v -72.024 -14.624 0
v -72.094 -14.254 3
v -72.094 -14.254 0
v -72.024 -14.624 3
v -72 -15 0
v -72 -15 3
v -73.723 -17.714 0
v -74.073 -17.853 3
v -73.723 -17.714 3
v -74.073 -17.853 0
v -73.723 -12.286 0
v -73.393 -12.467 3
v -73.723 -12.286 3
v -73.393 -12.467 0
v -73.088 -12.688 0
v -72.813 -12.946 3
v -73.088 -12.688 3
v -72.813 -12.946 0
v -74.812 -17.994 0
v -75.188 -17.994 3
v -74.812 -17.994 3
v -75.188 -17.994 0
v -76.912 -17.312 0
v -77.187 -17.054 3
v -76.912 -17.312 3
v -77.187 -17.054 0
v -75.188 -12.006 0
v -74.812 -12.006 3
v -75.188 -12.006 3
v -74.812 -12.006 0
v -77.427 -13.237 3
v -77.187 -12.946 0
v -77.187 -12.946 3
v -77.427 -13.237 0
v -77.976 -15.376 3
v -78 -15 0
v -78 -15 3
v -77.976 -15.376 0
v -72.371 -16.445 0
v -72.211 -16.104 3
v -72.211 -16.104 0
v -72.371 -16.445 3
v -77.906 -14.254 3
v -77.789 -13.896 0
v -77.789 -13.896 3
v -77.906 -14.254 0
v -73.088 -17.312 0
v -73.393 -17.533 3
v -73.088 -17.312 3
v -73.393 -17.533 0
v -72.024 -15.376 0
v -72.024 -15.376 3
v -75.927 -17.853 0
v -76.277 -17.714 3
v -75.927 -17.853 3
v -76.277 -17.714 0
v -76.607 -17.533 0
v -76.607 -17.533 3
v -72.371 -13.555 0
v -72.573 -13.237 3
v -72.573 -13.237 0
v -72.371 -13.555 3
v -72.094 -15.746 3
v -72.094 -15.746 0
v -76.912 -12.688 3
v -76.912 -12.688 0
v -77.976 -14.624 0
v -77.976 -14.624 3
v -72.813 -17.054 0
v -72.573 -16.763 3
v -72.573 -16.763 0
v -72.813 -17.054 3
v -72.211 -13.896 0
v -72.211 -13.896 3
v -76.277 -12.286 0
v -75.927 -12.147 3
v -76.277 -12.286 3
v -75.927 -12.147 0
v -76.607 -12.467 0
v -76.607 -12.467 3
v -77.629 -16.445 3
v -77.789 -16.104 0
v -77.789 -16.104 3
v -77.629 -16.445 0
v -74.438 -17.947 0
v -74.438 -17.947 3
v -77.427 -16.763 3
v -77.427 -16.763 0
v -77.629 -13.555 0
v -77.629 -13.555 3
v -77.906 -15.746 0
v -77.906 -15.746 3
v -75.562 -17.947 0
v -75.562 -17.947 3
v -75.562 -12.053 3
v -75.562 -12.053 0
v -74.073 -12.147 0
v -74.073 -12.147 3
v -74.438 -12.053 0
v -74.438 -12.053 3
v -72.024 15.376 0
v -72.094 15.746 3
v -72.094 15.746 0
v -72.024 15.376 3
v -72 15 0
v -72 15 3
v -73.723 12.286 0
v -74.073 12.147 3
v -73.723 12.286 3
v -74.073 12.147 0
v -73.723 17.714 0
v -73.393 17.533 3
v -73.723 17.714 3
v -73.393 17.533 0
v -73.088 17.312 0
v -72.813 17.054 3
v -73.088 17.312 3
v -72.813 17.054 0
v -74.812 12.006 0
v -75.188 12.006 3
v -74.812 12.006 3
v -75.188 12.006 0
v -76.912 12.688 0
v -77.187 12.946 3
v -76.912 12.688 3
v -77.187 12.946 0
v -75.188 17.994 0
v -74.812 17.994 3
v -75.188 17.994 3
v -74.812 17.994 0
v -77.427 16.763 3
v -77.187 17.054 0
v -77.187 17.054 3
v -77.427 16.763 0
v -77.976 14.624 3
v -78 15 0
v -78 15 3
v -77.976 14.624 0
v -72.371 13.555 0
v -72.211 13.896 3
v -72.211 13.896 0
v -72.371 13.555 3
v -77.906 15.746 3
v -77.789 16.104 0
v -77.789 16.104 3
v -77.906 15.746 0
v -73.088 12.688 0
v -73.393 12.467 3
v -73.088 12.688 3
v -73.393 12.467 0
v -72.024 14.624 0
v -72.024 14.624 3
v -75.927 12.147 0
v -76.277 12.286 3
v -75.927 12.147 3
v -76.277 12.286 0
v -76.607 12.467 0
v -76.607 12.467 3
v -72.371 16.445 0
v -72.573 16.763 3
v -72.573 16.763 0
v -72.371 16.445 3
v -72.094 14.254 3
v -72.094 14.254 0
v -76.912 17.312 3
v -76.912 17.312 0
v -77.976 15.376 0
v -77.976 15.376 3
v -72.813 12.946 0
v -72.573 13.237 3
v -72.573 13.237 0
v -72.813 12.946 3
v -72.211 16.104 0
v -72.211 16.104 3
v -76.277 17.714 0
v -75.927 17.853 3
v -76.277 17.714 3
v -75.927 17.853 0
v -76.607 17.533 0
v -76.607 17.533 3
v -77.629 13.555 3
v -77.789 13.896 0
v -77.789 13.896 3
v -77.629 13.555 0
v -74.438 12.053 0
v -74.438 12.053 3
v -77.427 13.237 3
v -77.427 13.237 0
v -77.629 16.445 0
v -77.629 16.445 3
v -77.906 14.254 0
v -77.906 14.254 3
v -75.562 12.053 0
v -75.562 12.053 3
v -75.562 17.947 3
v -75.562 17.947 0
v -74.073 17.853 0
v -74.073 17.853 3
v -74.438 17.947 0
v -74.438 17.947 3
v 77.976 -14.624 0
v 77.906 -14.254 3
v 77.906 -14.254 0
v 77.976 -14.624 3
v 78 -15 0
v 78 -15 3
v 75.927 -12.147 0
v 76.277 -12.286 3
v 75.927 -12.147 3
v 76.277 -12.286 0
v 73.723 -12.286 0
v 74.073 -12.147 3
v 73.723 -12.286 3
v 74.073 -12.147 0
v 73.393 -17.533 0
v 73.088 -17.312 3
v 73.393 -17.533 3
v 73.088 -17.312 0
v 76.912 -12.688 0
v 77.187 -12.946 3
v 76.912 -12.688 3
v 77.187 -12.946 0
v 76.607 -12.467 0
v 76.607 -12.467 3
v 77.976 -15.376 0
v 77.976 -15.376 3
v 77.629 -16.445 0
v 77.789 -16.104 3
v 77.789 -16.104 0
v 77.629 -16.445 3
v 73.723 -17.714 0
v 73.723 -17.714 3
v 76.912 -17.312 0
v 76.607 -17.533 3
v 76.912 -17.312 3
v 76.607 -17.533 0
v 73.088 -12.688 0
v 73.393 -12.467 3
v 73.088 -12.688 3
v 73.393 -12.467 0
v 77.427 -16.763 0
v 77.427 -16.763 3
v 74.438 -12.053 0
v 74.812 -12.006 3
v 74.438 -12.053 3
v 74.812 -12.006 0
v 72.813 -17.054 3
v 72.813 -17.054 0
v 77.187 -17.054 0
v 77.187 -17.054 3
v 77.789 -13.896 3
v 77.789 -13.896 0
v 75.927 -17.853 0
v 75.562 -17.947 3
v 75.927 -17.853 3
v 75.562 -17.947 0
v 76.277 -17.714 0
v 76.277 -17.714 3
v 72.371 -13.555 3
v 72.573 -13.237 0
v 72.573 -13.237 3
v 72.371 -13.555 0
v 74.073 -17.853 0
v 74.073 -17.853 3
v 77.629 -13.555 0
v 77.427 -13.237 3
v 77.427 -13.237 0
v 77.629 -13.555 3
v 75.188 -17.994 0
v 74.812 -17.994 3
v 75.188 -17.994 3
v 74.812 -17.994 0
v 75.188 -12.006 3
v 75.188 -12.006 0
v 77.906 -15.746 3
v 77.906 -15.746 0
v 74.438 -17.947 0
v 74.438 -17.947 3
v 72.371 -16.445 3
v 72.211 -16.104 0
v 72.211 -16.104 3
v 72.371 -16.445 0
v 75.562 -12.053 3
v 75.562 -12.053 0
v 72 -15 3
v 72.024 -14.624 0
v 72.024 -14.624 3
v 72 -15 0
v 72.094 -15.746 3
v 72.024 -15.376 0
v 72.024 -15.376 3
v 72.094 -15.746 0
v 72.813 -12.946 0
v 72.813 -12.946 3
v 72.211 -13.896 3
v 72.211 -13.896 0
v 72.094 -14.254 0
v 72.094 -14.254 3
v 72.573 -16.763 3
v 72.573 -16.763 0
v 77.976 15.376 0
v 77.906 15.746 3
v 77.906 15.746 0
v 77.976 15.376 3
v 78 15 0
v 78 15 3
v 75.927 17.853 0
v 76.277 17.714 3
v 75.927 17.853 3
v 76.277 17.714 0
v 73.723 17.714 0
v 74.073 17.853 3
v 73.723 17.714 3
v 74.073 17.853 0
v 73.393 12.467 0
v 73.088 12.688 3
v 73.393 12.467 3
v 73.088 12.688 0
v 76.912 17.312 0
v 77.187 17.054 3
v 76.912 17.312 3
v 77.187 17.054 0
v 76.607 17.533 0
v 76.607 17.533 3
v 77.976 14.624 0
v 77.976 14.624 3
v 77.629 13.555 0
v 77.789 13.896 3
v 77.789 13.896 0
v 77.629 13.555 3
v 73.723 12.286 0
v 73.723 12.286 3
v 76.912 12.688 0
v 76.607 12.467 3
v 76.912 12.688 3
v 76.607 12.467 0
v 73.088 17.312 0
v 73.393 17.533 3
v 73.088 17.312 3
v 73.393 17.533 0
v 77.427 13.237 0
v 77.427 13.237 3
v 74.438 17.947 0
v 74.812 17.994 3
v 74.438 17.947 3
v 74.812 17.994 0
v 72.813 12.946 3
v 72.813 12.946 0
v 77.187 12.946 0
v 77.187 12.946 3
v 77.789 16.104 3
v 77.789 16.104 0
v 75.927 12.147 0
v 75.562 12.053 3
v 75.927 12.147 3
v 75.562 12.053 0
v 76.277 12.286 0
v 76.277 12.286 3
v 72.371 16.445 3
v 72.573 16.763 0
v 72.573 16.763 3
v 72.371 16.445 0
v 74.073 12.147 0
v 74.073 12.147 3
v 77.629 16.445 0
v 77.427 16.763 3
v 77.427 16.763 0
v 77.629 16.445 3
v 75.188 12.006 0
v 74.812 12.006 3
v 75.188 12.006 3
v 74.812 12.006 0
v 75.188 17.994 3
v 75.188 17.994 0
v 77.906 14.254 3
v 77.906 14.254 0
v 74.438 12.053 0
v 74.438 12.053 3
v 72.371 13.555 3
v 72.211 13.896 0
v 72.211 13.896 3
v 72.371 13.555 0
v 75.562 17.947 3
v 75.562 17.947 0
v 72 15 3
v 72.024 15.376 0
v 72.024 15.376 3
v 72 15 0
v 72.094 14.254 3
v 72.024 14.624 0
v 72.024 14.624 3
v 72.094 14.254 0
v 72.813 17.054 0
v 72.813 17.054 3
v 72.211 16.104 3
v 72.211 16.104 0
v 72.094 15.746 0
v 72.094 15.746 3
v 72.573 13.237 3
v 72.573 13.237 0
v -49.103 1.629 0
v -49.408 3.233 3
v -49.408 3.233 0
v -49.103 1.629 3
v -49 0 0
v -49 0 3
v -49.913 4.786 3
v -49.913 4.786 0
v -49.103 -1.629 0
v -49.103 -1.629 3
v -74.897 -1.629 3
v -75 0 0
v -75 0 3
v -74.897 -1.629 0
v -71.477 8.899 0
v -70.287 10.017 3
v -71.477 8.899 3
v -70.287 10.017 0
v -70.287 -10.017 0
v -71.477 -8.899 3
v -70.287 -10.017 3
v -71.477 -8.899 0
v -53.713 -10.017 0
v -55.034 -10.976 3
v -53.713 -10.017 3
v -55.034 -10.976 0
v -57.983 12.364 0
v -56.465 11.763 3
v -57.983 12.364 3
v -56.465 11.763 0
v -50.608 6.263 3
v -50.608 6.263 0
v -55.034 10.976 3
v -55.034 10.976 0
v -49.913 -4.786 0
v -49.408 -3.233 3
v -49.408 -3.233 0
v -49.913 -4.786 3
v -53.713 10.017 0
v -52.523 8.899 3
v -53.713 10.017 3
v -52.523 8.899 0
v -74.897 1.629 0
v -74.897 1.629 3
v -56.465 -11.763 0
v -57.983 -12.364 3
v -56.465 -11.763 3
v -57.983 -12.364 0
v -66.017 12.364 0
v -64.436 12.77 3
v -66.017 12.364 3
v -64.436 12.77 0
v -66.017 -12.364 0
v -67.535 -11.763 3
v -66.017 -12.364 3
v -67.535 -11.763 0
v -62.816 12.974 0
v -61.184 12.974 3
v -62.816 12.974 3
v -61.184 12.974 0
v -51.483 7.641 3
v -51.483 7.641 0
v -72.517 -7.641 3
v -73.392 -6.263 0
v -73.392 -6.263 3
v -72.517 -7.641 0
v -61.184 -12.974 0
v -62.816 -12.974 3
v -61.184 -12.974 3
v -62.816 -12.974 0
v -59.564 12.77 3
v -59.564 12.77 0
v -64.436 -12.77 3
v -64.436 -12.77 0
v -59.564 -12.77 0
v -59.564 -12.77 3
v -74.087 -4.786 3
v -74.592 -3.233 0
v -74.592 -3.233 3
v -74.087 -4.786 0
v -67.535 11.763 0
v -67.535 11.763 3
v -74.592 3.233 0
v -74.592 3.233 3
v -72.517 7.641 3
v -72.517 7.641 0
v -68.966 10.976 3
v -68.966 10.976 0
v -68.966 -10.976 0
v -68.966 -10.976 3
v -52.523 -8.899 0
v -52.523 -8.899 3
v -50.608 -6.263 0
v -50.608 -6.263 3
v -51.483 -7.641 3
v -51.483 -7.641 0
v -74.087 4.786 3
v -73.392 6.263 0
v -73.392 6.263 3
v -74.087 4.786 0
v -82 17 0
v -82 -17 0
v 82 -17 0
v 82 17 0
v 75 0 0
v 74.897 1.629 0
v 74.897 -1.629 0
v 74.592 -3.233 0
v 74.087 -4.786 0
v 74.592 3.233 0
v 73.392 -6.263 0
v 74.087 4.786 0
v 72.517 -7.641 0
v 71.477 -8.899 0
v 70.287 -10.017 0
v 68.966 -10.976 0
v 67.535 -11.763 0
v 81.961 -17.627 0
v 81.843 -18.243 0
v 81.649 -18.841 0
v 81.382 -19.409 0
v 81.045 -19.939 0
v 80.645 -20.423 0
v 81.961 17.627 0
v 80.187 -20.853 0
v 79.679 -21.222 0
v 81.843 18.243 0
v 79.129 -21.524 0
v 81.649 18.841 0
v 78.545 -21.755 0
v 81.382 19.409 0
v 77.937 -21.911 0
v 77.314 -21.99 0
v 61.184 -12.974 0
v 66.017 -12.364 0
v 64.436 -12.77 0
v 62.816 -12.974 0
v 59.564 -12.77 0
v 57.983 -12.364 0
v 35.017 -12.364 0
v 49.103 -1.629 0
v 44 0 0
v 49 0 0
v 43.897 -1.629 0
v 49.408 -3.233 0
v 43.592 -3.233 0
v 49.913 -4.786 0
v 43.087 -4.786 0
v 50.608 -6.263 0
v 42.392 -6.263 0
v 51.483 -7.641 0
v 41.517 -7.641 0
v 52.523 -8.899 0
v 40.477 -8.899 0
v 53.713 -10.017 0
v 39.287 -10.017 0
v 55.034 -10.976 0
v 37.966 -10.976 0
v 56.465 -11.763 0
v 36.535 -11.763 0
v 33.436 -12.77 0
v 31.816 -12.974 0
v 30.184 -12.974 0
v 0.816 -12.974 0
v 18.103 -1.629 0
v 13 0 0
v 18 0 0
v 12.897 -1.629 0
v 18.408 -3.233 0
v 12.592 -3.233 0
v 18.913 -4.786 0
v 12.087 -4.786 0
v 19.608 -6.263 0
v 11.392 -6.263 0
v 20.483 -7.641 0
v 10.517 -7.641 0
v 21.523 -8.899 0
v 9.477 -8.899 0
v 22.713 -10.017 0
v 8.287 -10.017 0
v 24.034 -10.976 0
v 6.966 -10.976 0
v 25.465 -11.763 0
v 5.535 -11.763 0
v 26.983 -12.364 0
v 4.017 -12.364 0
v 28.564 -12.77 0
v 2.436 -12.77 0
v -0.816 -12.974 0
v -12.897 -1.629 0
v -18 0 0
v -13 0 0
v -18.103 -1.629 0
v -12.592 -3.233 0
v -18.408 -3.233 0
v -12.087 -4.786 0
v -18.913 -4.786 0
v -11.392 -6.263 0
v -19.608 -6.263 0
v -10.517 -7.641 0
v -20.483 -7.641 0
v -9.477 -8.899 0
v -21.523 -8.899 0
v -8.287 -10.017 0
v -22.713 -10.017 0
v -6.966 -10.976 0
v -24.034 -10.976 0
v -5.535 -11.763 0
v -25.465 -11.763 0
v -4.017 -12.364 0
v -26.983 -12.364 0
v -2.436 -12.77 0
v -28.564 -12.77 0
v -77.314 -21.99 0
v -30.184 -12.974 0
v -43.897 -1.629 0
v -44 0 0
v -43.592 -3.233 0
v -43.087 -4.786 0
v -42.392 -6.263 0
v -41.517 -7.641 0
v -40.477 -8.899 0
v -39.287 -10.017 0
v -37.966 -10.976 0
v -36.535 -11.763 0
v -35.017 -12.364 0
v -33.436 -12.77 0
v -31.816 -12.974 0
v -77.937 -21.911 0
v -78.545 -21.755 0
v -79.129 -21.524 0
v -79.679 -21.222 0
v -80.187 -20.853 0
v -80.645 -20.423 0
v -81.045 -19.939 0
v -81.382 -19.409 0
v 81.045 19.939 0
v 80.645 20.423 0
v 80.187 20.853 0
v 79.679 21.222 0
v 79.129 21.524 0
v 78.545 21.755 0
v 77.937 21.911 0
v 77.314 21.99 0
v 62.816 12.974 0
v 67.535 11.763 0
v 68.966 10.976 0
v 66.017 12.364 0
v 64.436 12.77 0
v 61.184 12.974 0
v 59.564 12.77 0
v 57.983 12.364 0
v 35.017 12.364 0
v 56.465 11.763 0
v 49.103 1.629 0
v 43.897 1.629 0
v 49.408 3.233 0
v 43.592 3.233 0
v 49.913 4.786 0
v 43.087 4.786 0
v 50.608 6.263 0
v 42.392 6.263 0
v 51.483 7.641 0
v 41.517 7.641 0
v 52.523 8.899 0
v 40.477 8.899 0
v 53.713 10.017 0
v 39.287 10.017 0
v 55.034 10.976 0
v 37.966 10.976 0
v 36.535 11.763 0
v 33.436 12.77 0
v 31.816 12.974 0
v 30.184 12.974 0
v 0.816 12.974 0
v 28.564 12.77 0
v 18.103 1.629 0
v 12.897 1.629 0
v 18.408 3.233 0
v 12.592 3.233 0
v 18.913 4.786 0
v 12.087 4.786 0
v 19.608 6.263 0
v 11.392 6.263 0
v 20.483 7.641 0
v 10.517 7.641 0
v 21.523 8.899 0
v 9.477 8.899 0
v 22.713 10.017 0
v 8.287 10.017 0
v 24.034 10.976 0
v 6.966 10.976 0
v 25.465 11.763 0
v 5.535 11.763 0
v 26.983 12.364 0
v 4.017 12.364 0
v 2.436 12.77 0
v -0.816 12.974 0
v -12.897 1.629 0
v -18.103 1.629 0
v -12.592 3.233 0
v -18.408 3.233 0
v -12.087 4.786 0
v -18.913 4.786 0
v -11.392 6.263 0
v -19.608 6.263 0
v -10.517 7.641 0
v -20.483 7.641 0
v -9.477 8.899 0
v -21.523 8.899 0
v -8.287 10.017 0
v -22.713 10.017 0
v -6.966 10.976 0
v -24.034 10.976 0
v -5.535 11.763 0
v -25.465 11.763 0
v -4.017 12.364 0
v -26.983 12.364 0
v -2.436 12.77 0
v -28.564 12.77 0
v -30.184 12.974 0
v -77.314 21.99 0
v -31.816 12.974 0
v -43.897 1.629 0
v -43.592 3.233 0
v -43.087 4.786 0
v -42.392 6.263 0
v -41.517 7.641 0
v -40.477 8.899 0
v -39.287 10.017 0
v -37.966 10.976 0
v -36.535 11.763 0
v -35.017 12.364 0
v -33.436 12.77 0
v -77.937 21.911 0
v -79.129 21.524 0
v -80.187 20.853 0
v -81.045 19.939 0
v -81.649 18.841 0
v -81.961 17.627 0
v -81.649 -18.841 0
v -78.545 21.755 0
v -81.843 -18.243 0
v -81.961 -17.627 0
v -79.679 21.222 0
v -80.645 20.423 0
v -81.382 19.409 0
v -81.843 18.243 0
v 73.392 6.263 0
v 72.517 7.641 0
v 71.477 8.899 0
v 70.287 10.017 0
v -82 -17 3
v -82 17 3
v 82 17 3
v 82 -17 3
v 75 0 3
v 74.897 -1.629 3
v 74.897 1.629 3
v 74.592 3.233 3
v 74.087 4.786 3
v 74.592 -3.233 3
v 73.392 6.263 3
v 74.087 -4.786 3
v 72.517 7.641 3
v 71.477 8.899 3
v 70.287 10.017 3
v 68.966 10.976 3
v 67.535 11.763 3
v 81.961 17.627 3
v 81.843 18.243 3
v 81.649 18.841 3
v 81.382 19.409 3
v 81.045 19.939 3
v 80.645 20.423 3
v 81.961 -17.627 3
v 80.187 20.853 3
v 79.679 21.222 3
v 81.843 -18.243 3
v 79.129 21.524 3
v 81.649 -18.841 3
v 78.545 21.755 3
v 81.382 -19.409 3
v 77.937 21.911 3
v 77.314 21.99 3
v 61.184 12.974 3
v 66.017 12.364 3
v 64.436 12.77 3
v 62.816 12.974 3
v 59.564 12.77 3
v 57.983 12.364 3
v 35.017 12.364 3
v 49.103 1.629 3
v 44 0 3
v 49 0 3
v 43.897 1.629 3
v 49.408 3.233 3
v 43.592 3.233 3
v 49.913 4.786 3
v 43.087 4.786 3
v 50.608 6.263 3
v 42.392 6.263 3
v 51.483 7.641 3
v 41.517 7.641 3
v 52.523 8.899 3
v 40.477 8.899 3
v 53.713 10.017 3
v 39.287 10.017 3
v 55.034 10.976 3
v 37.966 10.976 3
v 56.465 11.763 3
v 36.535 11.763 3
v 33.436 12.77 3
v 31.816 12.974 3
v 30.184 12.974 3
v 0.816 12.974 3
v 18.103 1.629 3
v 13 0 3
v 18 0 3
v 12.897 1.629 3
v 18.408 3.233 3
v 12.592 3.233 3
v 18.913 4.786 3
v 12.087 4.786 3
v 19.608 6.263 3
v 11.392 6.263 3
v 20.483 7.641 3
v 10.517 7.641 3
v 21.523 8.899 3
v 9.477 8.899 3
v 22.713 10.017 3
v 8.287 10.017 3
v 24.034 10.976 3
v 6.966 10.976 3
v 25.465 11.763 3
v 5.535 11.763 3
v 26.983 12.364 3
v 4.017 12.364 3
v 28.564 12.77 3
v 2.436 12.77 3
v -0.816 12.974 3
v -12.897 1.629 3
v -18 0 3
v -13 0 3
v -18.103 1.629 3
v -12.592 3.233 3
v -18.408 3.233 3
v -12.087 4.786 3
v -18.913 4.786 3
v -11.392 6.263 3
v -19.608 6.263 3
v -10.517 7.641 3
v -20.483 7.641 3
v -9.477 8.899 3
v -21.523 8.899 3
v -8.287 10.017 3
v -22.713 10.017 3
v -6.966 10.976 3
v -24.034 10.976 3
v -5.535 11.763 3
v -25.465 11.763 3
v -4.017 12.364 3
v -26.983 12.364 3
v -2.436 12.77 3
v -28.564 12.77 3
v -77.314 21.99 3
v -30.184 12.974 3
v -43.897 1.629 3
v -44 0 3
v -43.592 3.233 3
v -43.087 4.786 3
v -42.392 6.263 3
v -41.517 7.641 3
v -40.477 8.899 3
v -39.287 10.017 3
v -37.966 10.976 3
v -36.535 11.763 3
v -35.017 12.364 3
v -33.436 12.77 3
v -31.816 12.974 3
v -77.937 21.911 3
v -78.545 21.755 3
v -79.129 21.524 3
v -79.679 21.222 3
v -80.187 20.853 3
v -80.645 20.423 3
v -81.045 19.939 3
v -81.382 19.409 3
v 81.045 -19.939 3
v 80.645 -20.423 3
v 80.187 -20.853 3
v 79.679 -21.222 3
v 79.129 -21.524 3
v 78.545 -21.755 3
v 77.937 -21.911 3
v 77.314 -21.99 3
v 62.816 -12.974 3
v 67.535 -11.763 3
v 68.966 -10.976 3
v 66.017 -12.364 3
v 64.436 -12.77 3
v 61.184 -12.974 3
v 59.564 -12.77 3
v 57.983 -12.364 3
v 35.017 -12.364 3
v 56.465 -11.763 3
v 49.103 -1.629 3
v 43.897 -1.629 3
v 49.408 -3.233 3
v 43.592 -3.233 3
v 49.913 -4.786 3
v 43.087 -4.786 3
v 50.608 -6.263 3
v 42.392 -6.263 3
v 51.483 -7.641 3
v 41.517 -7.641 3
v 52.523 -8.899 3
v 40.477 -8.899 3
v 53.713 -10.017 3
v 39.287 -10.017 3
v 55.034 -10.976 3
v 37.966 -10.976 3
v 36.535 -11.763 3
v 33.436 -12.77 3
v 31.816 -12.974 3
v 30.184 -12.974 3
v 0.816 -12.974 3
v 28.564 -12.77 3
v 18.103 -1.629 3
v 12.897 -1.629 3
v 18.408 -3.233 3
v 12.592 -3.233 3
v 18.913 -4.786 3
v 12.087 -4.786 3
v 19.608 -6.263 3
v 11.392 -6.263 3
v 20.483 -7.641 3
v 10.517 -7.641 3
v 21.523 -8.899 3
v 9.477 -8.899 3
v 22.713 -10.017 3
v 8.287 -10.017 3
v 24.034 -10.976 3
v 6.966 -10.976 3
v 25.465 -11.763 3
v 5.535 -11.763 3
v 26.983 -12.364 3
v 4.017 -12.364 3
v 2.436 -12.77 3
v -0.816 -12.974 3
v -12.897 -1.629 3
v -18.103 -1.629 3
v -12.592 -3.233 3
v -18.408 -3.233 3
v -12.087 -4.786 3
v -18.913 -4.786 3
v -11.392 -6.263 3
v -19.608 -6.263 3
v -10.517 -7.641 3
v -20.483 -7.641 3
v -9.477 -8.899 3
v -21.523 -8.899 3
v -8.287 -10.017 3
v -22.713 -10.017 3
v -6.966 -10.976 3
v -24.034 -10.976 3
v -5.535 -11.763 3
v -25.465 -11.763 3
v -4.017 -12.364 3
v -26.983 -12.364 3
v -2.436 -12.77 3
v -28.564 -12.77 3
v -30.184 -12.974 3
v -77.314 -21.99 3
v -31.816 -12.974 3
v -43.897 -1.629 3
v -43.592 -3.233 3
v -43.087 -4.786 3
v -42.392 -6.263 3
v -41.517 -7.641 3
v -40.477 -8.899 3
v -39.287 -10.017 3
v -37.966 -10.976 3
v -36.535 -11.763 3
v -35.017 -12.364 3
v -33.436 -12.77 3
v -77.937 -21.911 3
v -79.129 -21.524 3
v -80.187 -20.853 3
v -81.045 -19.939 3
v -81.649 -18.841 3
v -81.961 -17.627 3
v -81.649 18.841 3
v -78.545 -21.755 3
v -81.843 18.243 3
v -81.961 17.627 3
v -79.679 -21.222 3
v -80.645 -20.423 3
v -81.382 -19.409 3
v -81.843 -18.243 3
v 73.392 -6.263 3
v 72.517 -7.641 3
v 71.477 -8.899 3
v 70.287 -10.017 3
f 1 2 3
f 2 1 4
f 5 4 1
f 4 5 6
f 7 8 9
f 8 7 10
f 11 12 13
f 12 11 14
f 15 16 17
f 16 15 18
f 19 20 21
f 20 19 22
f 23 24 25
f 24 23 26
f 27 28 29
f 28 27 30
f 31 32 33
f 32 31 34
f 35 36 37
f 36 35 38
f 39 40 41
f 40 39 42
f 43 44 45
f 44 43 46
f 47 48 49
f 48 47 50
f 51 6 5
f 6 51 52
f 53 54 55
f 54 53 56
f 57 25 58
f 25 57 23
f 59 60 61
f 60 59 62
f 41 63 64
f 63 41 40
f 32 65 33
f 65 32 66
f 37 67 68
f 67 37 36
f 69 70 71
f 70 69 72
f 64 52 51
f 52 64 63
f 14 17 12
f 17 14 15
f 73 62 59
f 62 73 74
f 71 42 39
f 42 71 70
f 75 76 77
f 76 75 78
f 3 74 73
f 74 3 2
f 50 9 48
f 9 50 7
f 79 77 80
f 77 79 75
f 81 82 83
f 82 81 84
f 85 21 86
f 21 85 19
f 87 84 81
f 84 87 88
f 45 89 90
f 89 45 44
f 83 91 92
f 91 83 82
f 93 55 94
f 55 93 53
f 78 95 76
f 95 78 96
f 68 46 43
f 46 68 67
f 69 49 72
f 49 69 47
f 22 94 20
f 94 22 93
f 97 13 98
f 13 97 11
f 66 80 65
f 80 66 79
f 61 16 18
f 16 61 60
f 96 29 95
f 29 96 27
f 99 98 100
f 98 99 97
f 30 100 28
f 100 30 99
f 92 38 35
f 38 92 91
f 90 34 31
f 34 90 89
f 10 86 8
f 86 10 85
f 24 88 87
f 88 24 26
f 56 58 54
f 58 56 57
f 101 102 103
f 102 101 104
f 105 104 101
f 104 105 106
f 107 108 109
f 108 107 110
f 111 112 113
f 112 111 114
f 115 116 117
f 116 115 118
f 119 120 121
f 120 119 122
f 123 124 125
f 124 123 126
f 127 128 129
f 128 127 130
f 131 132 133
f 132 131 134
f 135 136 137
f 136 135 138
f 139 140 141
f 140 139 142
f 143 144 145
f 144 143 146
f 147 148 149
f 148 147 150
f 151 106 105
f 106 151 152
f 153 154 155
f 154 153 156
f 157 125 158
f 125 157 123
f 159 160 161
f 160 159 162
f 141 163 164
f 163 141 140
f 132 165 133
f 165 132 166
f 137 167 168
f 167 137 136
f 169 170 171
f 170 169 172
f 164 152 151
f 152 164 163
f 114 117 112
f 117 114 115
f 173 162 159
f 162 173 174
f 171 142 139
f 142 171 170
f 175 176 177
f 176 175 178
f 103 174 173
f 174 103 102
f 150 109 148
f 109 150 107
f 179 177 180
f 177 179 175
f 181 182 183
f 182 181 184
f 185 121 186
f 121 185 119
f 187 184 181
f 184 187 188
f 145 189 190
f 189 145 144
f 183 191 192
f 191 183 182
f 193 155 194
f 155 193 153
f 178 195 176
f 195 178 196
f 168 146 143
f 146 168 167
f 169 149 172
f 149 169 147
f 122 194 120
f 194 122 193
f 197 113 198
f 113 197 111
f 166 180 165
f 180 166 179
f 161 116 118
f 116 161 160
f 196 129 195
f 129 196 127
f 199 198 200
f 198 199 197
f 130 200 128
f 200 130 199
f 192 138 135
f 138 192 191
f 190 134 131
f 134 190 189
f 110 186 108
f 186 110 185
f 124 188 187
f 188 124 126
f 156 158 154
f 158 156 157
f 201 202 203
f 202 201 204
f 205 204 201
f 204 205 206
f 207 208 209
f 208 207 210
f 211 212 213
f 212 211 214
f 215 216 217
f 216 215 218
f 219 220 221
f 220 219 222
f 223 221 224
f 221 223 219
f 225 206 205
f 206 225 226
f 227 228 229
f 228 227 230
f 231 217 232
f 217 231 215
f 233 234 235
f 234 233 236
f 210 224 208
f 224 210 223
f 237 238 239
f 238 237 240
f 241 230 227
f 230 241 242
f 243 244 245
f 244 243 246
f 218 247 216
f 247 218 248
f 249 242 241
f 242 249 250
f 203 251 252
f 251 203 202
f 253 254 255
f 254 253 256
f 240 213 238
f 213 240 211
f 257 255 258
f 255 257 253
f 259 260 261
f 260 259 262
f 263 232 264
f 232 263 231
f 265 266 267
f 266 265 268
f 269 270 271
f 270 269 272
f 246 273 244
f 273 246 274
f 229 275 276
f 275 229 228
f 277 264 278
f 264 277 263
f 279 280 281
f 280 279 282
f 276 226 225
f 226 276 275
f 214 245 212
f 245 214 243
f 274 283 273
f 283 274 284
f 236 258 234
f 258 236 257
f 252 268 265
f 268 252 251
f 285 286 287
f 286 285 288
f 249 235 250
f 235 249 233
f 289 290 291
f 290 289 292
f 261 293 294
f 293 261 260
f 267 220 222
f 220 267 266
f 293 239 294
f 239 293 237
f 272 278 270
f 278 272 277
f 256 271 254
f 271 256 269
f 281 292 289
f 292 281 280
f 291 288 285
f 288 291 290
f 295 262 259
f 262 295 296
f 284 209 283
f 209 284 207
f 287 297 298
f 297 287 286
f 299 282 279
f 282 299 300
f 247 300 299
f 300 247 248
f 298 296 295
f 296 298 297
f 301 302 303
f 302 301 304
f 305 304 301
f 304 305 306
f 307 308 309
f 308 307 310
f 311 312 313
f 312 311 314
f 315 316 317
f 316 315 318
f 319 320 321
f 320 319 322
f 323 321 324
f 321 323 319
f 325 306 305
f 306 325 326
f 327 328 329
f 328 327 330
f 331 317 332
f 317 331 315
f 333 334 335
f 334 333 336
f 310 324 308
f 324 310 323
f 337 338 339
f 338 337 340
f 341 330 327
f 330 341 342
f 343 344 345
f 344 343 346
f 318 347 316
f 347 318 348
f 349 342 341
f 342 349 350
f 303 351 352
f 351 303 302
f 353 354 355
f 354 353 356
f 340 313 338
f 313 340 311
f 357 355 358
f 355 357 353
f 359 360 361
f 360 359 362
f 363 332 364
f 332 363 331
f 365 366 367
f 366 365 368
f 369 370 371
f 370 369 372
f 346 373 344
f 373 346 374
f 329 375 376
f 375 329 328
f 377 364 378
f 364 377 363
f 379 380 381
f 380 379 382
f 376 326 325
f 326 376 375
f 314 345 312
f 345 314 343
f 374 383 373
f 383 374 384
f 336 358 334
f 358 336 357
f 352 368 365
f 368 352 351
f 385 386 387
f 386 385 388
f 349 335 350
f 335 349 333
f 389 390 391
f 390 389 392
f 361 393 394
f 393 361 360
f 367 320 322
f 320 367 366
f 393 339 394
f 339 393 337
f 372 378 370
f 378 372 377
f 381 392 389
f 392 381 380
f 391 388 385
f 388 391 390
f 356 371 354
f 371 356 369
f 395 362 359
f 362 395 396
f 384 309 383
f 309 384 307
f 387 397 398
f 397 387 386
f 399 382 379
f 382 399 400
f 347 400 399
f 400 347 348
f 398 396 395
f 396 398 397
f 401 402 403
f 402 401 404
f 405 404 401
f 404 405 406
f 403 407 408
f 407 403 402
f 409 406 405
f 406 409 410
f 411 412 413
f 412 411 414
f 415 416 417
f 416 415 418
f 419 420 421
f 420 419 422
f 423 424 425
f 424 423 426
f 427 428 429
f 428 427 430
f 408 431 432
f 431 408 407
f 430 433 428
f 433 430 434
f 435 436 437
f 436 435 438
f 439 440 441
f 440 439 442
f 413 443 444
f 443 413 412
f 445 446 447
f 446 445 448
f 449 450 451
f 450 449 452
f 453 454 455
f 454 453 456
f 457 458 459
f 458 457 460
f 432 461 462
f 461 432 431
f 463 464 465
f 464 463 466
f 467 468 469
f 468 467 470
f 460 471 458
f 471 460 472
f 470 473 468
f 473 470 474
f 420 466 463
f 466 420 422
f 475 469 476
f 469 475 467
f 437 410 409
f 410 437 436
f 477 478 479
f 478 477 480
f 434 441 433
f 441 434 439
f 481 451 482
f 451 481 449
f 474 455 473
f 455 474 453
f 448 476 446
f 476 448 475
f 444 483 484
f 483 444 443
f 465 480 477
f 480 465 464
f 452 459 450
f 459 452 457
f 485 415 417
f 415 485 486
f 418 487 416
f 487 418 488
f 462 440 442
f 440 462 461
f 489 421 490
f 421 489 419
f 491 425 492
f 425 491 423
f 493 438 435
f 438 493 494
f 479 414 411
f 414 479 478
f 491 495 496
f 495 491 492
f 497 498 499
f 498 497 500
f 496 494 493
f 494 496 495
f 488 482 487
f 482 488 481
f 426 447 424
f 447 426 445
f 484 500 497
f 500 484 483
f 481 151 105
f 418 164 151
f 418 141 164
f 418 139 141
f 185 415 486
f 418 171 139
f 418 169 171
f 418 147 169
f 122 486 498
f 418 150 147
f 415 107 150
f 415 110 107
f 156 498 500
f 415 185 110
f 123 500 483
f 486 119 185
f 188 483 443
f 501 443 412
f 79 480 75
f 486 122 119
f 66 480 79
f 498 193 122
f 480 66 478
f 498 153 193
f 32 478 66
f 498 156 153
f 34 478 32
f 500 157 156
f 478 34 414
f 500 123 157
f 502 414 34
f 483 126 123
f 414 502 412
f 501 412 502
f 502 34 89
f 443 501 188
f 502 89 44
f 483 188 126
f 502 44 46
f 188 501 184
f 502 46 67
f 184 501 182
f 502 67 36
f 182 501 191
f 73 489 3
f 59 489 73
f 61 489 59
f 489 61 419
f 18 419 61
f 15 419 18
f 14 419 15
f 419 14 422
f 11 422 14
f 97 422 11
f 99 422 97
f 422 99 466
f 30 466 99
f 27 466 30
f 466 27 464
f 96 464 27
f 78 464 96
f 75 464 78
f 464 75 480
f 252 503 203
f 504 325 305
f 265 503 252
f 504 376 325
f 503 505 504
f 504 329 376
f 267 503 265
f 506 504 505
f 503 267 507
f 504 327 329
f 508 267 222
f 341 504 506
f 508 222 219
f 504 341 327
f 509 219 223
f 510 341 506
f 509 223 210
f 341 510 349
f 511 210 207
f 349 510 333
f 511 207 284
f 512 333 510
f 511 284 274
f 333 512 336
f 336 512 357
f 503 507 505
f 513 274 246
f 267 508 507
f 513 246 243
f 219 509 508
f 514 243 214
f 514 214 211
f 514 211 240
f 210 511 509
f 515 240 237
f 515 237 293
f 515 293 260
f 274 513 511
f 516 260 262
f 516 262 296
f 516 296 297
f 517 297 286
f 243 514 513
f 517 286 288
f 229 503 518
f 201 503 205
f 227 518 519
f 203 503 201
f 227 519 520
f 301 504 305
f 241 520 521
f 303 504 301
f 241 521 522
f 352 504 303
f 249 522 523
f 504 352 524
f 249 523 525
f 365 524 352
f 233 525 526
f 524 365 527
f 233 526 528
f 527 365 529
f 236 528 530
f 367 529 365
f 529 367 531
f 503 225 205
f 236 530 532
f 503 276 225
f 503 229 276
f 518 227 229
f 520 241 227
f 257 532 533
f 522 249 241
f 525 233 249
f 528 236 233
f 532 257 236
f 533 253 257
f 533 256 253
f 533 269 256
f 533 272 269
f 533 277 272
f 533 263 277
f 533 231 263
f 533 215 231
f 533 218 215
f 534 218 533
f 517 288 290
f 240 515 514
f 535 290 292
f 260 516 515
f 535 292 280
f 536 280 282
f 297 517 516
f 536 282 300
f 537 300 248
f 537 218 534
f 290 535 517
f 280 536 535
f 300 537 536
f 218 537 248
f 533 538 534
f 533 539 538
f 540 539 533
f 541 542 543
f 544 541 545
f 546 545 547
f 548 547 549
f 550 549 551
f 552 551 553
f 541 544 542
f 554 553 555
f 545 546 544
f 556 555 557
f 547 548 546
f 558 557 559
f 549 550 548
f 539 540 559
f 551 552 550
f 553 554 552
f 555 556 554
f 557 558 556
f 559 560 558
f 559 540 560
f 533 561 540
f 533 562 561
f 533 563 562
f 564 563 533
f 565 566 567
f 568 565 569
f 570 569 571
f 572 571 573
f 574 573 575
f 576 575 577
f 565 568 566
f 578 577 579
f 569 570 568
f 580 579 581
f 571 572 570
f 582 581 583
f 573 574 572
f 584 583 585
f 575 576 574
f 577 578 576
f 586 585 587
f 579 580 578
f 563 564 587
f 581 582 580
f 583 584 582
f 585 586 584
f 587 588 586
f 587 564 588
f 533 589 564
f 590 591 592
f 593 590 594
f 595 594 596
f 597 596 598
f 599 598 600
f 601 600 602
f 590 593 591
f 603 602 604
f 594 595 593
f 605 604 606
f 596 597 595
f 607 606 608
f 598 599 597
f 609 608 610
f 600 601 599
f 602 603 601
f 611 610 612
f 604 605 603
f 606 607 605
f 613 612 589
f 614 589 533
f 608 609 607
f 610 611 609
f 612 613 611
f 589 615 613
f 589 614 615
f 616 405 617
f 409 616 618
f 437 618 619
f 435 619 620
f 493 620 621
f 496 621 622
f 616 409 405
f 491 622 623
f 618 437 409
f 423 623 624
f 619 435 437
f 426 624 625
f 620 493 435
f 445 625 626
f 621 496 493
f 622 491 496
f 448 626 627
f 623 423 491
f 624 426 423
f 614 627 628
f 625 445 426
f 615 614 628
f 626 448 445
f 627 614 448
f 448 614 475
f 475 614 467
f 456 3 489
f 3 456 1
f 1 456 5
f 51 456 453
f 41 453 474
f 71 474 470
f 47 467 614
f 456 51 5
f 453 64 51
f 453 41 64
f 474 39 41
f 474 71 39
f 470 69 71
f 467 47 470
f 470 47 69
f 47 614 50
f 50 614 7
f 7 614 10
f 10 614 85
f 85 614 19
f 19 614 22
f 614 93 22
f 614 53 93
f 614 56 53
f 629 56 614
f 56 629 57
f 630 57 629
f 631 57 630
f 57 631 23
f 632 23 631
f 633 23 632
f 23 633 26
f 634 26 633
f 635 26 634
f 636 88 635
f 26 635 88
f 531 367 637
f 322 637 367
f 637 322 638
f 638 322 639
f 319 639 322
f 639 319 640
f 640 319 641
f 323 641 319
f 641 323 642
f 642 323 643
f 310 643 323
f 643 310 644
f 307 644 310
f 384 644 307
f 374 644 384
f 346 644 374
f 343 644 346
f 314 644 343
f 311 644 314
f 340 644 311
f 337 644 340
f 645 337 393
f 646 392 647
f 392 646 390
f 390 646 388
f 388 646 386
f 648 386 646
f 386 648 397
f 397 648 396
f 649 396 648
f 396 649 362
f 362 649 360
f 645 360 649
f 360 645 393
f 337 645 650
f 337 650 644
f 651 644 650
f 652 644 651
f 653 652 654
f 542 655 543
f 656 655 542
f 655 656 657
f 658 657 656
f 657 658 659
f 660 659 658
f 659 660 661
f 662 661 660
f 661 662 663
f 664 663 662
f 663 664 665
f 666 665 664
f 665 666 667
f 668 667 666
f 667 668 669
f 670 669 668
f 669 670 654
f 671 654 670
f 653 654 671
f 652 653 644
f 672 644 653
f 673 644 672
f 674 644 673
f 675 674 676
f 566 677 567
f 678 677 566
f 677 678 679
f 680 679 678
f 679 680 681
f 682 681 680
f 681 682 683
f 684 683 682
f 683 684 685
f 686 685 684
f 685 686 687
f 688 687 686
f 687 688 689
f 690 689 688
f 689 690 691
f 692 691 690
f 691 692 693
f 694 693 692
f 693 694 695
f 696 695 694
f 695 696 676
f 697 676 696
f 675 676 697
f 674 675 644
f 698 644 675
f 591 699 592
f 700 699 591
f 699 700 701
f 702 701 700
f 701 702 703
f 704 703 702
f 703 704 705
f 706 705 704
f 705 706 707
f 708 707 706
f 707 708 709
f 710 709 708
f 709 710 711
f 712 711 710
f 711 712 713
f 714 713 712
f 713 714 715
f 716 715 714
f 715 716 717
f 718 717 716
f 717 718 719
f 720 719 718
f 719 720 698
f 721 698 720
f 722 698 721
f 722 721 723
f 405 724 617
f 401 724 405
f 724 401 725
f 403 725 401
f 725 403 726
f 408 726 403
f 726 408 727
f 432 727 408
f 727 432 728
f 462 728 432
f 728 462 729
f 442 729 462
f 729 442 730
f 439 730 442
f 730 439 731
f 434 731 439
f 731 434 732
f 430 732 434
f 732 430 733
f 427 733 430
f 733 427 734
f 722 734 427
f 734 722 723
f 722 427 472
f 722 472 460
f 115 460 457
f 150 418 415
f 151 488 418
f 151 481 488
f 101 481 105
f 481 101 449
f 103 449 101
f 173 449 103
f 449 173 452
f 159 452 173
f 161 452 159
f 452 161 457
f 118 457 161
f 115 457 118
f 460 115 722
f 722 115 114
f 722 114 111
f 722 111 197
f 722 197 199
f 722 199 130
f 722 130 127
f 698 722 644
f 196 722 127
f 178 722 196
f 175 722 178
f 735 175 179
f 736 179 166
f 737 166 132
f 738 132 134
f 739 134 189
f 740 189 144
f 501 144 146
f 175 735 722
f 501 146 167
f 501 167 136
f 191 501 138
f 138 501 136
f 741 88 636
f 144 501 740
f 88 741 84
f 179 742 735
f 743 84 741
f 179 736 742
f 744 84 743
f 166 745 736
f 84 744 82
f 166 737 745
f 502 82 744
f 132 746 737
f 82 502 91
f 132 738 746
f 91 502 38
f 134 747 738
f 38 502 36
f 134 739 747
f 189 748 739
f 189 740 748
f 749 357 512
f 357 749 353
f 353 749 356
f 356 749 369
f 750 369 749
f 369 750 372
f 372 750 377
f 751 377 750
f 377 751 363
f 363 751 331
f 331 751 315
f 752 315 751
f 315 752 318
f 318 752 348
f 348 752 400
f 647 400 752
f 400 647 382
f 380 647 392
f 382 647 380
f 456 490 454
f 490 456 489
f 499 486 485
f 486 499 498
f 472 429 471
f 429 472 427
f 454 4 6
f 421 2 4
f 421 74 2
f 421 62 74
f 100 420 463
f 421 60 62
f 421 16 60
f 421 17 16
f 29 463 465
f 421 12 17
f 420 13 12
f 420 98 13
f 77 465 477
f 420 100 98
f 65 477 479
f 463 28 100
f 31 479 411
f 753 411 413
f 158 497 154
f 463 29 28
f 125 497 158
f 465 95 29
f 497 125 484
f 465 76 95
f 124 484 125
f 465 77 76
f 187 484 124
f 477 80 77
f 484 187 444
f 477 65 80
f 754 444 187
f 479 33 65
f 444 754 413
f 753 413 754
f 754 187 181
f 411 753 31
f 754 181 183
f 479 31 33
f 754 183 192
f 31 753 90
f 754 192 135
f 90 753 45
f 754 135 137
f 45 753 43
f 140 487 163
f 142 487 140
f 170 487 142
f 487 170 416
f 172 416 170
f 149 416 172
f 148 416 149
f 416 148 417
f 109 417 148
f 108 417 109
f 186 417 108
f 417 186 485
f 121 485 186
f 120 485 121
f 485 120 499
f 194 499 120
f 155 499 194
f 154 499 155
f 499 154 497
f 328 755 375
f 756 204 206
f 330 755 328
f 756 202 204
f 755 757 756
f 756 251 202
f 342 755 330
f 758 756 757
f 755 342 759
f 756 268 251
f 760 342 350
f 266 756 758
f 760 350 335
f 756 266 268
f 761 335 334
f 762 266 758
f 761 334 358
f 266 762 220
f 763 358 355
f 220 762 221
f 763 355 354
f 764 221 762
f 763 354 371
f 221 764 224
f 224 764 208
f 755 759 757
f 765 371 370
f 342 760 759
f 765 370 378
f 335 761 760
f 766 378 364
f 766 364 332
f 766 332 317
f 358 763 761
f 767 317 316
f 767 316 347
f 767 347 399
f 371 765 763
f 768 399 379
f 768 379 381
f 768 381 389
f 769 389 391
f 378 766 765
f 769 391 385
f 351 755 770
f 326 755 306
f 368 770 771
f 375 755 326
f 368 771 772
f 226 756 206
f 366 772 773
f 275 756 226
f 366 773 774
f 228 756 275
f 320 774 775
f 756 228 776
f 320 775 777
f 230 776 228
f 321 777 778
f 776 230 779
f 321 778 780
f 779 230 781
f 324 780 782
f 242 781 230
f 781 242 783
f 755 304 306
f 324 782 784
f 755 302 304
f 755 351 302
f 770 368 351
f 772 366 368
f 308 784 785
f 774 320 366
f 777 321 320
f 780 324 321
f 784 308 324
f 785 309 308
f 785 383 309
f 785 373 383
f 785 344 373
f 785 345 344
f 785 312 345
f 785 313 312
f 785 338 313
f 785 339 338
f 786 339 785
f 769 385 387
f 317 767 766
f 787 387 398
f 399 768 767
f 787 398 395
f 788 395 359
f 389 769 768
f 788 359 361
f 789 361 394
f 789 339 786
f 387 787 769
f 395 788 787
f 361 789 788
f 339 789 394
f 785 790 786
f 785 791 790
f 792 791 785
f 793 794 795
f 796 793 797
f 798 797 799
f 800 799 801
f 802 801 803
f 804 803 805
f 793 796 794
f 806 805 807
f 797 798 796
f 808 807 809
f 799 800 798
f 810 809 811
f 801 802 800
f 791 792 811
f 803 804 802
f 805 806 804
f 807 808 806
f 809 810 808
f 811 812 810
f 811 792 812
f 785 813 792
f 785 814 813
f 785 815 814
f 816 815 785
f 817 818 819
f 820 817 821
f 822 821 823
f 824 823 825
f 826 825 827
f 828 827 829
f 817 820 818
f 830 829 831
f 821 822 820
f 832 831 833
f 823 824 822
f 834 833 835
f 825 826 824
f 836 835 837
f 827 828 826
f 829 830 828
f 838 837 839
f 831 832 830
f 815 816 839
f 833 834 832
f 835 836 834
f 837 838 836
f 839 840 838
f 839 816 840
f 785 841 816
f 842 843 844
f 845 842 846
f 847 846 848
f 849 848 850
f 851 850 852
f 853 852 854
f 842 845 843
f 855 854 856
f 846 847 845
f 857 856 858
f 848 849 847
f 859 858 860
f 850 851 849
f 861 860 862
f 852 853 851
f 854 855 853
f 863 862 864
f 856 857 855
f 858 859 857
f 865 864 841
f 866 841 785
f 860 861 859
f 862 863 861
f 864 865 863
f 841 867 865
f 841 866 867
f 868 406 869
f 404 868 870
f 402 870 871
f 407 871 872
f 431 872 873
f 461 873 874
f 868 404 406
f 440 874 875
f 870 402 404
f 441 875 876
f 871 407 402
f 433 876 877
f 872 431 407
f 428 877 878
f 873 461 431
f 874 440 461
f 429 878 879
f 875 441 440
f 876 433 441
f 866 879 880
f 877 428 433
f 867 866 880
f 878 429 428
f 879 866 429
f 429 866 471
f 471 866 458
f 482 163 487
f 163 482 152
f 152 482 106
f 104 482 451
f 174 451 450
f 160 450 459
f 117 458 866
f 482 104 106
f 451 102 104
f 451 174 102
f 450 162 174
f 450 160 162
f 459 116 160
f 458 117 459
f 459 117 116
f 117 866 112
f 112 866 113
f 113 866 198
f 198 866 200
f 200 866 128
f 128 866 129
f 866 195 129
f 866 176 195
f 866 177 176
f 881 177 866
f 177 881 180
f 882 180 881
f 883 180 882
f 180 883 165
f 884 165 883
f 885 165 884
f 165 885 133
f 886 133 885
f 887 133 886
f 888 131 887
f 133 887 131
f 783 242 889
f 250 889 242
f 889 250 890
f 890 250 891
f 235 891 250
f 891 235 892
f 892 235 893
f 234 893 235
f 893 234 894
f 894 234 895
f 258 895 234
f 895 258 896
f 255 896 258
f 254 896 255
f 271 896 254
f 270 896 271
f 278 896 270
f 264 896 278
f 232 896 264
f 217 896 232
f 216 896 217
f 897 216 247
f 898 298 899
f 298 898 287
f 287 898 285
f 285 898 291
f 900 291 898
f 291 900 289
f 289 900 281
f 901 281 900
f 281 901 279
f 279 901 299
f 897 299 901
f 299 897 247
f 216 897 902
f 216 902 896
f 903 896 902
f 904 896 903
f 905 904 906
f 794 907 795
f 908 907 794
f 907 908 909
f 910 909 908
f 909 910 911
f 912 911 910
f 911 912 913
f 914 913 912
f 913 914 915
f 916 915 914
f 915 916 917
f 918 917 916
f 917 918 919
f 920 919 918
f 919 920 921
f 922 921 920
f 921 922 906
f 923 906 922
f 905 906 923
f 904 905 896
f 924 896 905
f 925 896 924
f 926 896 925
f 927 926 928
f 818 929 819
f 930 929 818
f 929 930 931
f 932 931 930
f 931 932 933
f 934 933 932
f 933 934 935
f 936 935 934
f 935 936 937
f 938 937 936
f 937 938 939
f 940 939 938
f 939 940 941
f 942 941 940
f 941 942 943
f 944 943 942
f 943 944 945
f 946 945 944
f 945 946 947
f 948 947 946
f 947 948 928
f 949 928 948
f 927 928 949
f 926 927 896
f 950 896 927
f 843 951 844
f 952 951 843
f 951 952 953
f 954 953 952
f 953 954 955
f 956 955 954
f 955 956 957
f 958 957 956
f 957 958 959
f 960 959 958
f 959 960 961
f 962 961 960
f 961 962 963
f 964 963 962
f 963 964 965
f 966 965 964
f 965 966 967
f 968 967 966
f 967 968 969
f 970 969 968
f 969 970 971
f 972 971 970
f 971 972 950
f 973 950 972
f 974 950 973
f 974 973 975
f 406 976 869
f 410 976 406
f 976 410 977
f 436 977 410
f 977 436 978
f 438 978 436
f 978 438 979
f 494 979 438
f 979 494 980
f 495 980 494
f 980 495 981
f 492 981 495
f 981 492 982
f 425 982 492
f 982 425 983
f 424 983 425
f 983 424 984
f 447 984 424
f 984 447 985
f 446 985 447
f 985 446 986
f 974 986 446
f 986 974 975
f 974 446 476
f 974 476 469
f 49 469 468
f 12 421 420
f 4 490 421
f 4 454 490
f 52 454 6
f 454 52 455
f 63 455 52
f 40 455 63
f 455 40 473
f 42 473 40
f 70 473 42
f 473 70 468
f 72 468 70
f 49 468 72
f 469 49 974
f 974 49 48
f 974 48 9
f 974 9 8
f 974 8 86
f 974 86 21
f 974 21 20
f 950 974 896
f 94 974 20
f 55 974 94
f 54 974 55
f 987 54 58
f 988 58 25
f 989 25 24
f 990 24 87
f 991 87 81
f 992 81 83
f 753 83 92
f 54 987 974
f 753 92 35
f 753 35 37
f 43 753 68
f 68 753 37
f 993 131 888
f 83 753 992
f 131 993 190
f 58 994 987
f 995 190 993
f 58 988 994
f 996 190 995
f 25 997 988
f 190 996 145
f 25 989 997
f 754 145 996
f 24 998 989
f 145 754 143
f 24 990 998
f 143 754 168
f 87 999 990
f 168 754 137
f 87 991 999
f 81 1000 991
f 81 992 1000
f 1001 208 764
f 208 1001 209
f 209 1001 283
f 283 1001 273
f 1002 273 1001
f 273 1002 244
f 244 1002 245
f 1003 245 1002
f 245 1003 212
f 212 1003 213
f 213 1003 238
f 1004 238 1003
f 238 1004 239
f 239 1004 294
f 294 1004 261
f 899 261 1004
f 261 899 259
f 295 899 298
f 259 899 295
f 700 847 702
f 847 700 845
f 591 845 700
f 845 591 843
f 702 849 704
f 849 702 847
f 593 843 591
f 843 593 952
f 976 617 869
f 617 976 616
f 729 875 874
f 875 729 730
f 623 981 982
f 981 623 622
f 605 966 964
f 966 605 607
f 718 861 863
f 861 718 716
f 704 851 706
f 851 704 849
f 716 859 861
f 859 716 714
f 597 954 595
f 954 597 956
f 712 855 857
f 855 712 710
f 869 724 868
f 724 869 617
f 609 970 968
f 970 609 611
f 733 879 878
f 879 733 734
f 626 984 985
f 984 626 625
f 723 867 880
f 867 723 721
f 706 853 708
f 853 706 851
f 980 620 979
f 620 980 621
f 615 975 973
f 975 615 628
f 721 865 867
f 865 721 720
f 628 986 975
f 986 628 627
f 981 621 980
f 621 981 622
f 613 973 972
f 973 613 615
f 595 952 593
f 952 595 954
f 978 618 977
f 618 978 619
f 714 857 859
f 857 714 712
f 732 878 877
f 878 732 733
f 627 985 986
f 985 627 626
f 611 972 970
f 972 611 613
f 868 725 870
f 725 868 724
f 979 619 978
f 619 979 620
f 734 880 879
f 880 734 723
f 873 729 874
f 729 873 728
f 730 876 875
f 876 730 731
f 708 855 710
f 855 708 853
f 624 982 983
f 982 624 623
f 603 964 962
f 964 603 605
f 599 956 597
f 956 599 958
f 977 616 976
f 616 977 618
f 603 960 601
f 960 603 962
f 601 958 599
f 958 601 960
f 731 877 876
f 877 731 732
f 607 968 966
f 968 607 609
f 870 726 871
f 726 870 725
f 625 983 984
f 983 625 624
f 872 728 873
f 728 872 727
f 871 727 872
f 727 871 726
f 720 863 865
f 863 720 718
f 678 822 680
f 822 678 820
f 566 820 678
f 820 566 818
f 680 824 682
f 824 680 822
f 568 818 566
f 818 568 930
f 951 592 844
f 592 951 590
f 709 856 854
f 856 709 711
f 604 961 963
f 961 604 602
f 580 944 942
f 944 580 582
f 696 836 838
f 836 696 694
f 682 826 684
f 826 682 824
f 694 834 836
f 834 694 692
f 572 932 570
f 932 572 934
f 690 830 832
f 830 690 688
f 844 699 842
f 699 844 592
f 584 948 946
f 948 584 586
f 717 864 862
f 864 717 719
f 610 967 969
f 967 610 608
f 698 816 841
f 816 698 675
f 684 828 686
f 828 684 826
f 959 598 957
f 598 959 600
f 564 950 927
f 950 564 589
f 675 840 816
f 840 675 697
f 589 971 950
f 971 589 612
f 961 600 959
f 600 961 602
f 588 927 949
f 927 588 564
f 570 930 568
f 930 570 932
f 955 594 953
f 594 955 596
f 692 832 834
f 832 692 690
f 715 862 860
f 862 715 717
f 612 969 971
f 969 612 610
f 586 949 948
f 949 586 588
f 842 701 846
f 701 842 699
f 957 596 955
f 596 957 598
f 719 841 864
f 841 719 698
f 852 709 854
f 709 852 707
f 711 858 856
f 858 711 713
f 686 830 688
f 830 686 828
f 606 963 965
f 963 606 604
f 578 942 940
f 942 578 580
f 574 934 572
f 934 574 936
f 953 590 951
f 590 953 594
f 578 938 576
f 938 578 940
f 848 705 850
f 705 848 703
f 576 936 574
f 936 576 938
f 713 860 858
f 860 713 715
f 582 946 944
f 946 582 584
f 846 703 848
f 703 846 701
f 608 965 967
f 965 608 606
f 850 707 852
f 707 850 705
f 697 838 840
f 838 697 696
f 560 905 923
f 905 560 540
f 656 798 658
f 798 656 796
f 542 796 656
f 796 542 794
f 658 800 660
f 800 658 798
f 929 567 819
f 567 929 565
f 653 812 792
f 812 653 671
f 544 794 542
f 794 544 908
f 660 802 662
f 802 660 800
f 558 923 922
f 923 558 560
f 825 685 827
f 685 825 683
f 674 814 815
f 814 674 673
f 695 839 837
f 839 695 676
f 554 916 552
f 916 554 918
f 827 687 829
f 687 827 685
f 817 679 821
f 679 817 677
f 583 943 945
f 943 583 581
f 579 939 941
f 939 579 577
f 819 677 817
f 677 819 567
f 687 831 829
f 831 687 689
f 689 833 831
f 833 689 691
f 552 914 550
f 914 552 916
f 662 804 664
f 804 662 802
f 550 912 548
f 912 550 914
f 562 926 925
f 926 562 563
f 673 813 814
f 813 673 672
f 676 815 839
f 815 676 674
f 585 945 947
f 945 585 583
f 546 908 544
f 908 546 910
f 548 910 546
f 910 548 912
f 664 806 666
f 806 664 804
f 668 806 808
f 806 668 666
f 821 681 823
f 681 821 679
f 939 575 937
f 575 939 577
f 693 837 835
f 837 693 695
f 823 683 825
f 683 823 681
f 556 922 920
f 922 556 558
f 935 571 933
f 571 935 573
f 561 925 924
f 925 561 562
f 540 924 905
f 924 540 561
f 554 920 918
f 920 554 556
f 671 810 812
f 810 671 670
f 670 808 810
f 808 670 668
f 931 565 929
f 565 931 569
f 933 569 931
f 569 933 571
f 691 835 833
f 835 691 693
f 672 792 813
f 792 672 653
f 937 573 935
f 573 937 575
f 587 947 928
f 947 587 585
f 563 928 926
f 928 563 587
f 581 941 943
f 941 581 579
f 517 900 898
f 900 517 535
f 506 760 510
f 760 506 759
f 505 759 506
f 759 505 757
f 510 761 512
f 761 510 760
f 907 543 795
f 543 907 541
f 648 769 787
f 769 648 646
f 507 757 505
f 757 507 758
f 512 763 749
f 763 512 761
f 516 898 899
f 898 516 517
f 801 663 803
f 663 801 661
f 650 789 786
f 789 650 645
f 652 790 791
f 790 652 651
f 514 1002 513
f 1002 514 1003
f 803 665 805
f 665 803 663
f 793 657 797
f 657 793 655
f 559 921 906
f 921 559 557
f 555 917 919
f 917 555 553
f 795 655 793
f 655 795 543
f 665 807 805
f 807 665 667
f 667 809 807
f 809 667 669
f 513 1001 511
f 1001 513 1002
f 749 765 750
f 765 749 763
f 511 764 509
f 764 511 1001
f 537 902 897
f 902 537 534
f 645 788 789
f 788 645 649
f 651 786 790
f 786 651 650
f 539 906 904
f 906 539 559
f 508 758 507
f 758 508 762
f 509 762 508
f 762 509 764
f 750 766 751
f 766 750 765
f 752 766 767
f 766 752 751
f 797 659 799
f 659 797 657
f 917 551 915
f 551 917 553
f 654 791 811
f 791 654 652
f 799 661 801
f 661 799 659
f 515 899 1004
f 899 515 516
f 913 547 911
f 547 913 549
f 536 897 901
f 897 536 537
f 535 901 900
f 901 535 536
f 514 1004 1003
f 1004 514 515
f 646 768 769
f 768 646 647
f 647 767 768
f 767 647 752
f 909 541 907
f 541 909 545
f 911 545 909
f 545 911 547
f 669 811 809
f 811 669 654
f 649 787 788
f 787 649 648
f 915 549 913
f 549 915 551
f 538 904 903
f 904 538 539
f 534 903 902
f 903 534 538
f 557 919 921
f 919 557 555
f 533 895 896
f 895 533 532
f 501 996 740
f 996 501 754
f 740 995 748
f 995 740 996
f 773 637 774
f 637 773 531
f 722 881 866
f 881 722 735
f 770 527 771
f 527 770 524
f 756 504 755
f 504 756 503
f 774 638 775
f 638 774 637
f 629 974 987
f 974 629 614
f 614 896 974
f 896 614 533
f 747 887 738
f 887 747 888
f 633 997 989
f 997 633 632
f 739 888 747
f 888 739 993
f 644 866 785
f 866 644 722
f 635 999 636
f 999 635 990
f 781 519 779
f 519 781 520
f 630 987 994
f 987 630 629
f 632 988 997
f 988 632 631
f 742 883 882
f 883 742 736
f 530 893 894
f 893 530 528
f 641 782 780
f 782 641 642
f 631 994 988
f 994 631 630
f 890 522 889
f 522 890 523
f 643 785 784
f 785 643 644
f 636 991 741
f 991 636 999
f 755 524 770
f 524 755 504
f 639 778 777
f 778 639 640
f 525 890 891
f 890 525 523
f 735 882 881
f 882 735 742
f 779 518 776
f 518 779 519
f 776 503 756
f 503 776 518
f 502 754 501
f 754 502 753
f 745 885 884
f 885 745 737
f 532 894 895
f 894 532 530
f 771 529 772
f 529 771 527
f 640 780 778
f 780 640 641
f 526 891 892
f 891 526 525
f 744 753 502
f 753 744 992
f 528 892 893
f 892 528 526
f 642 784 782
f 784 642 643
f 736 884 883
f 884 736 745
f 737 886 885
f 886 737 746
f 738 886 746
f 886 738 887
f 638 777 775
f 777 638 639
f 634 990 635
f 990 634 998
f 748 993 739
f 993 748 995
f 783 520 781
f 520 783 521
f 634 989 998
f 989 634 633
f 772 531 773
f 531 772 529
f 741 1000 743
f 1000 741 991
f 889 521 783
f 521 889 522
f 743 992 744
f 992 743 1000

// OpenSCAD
$fn = 50;


difference() {
	union() {
		hull() {
			translate(v = [-77.0000000000, 17.0000000000, 0]) {
				cylinder(h = 3, r = 5);
			}
			translate(v = [77.0000000000, 17.0000000000, 0]) {
				cylinder(h = 3, r = 5);
			}
			translate(v = [-77.0000000000, -17.0000000000, 0]) {
				cylinder(h = 3, r = 5);
			}
			translate(v = [77.0000000000, -17.0000000000, 0]) {
				cylinder(h = 3, r = 5);
			}
		}
	}
	union() {
		#translate(v = [-75.0000000000, -15.0000000000, -100.0000000000]) {
			cylinder(h = 200, r = 3.0000000000);
		}
		#translate(v = [-75.0000000000, 15.0000000000, -100.0000000000]) {
			cylinder(h = 200, r = 3.0000000000);
		}
		#translate(v = [75.0000000000, -15.0000000000, -100.0000000000]) {
			cylinder(h = 200, r = 3.0000000000);
		}
		#translate(v = [75.0000000000, 15.0000000000, -100.0000000000]) {
			cylinder(h = 200, r = 3.0000000000);
		}
		#translate(v = [-62.0000000000, 0, 0]) {
			cylinder(h = 3, r = 13.0000000000);
		}
		#translate(v = [-31.0000000000, 0, 0]) {
			cylinder(h = 3, r = 13.0000000000);
		}
		#cylinder(h = 3, r = 13.0000000000);
		#translate(v = [31.0000000000, 0, 0]) {
			cylinder(h = 3, r = 13.0000000000);
		}
		#translate(v = [62.0000000000, 0, 0]) {
			cylinder(h = 3, r = 13.0000000000);
		}
	}
}
